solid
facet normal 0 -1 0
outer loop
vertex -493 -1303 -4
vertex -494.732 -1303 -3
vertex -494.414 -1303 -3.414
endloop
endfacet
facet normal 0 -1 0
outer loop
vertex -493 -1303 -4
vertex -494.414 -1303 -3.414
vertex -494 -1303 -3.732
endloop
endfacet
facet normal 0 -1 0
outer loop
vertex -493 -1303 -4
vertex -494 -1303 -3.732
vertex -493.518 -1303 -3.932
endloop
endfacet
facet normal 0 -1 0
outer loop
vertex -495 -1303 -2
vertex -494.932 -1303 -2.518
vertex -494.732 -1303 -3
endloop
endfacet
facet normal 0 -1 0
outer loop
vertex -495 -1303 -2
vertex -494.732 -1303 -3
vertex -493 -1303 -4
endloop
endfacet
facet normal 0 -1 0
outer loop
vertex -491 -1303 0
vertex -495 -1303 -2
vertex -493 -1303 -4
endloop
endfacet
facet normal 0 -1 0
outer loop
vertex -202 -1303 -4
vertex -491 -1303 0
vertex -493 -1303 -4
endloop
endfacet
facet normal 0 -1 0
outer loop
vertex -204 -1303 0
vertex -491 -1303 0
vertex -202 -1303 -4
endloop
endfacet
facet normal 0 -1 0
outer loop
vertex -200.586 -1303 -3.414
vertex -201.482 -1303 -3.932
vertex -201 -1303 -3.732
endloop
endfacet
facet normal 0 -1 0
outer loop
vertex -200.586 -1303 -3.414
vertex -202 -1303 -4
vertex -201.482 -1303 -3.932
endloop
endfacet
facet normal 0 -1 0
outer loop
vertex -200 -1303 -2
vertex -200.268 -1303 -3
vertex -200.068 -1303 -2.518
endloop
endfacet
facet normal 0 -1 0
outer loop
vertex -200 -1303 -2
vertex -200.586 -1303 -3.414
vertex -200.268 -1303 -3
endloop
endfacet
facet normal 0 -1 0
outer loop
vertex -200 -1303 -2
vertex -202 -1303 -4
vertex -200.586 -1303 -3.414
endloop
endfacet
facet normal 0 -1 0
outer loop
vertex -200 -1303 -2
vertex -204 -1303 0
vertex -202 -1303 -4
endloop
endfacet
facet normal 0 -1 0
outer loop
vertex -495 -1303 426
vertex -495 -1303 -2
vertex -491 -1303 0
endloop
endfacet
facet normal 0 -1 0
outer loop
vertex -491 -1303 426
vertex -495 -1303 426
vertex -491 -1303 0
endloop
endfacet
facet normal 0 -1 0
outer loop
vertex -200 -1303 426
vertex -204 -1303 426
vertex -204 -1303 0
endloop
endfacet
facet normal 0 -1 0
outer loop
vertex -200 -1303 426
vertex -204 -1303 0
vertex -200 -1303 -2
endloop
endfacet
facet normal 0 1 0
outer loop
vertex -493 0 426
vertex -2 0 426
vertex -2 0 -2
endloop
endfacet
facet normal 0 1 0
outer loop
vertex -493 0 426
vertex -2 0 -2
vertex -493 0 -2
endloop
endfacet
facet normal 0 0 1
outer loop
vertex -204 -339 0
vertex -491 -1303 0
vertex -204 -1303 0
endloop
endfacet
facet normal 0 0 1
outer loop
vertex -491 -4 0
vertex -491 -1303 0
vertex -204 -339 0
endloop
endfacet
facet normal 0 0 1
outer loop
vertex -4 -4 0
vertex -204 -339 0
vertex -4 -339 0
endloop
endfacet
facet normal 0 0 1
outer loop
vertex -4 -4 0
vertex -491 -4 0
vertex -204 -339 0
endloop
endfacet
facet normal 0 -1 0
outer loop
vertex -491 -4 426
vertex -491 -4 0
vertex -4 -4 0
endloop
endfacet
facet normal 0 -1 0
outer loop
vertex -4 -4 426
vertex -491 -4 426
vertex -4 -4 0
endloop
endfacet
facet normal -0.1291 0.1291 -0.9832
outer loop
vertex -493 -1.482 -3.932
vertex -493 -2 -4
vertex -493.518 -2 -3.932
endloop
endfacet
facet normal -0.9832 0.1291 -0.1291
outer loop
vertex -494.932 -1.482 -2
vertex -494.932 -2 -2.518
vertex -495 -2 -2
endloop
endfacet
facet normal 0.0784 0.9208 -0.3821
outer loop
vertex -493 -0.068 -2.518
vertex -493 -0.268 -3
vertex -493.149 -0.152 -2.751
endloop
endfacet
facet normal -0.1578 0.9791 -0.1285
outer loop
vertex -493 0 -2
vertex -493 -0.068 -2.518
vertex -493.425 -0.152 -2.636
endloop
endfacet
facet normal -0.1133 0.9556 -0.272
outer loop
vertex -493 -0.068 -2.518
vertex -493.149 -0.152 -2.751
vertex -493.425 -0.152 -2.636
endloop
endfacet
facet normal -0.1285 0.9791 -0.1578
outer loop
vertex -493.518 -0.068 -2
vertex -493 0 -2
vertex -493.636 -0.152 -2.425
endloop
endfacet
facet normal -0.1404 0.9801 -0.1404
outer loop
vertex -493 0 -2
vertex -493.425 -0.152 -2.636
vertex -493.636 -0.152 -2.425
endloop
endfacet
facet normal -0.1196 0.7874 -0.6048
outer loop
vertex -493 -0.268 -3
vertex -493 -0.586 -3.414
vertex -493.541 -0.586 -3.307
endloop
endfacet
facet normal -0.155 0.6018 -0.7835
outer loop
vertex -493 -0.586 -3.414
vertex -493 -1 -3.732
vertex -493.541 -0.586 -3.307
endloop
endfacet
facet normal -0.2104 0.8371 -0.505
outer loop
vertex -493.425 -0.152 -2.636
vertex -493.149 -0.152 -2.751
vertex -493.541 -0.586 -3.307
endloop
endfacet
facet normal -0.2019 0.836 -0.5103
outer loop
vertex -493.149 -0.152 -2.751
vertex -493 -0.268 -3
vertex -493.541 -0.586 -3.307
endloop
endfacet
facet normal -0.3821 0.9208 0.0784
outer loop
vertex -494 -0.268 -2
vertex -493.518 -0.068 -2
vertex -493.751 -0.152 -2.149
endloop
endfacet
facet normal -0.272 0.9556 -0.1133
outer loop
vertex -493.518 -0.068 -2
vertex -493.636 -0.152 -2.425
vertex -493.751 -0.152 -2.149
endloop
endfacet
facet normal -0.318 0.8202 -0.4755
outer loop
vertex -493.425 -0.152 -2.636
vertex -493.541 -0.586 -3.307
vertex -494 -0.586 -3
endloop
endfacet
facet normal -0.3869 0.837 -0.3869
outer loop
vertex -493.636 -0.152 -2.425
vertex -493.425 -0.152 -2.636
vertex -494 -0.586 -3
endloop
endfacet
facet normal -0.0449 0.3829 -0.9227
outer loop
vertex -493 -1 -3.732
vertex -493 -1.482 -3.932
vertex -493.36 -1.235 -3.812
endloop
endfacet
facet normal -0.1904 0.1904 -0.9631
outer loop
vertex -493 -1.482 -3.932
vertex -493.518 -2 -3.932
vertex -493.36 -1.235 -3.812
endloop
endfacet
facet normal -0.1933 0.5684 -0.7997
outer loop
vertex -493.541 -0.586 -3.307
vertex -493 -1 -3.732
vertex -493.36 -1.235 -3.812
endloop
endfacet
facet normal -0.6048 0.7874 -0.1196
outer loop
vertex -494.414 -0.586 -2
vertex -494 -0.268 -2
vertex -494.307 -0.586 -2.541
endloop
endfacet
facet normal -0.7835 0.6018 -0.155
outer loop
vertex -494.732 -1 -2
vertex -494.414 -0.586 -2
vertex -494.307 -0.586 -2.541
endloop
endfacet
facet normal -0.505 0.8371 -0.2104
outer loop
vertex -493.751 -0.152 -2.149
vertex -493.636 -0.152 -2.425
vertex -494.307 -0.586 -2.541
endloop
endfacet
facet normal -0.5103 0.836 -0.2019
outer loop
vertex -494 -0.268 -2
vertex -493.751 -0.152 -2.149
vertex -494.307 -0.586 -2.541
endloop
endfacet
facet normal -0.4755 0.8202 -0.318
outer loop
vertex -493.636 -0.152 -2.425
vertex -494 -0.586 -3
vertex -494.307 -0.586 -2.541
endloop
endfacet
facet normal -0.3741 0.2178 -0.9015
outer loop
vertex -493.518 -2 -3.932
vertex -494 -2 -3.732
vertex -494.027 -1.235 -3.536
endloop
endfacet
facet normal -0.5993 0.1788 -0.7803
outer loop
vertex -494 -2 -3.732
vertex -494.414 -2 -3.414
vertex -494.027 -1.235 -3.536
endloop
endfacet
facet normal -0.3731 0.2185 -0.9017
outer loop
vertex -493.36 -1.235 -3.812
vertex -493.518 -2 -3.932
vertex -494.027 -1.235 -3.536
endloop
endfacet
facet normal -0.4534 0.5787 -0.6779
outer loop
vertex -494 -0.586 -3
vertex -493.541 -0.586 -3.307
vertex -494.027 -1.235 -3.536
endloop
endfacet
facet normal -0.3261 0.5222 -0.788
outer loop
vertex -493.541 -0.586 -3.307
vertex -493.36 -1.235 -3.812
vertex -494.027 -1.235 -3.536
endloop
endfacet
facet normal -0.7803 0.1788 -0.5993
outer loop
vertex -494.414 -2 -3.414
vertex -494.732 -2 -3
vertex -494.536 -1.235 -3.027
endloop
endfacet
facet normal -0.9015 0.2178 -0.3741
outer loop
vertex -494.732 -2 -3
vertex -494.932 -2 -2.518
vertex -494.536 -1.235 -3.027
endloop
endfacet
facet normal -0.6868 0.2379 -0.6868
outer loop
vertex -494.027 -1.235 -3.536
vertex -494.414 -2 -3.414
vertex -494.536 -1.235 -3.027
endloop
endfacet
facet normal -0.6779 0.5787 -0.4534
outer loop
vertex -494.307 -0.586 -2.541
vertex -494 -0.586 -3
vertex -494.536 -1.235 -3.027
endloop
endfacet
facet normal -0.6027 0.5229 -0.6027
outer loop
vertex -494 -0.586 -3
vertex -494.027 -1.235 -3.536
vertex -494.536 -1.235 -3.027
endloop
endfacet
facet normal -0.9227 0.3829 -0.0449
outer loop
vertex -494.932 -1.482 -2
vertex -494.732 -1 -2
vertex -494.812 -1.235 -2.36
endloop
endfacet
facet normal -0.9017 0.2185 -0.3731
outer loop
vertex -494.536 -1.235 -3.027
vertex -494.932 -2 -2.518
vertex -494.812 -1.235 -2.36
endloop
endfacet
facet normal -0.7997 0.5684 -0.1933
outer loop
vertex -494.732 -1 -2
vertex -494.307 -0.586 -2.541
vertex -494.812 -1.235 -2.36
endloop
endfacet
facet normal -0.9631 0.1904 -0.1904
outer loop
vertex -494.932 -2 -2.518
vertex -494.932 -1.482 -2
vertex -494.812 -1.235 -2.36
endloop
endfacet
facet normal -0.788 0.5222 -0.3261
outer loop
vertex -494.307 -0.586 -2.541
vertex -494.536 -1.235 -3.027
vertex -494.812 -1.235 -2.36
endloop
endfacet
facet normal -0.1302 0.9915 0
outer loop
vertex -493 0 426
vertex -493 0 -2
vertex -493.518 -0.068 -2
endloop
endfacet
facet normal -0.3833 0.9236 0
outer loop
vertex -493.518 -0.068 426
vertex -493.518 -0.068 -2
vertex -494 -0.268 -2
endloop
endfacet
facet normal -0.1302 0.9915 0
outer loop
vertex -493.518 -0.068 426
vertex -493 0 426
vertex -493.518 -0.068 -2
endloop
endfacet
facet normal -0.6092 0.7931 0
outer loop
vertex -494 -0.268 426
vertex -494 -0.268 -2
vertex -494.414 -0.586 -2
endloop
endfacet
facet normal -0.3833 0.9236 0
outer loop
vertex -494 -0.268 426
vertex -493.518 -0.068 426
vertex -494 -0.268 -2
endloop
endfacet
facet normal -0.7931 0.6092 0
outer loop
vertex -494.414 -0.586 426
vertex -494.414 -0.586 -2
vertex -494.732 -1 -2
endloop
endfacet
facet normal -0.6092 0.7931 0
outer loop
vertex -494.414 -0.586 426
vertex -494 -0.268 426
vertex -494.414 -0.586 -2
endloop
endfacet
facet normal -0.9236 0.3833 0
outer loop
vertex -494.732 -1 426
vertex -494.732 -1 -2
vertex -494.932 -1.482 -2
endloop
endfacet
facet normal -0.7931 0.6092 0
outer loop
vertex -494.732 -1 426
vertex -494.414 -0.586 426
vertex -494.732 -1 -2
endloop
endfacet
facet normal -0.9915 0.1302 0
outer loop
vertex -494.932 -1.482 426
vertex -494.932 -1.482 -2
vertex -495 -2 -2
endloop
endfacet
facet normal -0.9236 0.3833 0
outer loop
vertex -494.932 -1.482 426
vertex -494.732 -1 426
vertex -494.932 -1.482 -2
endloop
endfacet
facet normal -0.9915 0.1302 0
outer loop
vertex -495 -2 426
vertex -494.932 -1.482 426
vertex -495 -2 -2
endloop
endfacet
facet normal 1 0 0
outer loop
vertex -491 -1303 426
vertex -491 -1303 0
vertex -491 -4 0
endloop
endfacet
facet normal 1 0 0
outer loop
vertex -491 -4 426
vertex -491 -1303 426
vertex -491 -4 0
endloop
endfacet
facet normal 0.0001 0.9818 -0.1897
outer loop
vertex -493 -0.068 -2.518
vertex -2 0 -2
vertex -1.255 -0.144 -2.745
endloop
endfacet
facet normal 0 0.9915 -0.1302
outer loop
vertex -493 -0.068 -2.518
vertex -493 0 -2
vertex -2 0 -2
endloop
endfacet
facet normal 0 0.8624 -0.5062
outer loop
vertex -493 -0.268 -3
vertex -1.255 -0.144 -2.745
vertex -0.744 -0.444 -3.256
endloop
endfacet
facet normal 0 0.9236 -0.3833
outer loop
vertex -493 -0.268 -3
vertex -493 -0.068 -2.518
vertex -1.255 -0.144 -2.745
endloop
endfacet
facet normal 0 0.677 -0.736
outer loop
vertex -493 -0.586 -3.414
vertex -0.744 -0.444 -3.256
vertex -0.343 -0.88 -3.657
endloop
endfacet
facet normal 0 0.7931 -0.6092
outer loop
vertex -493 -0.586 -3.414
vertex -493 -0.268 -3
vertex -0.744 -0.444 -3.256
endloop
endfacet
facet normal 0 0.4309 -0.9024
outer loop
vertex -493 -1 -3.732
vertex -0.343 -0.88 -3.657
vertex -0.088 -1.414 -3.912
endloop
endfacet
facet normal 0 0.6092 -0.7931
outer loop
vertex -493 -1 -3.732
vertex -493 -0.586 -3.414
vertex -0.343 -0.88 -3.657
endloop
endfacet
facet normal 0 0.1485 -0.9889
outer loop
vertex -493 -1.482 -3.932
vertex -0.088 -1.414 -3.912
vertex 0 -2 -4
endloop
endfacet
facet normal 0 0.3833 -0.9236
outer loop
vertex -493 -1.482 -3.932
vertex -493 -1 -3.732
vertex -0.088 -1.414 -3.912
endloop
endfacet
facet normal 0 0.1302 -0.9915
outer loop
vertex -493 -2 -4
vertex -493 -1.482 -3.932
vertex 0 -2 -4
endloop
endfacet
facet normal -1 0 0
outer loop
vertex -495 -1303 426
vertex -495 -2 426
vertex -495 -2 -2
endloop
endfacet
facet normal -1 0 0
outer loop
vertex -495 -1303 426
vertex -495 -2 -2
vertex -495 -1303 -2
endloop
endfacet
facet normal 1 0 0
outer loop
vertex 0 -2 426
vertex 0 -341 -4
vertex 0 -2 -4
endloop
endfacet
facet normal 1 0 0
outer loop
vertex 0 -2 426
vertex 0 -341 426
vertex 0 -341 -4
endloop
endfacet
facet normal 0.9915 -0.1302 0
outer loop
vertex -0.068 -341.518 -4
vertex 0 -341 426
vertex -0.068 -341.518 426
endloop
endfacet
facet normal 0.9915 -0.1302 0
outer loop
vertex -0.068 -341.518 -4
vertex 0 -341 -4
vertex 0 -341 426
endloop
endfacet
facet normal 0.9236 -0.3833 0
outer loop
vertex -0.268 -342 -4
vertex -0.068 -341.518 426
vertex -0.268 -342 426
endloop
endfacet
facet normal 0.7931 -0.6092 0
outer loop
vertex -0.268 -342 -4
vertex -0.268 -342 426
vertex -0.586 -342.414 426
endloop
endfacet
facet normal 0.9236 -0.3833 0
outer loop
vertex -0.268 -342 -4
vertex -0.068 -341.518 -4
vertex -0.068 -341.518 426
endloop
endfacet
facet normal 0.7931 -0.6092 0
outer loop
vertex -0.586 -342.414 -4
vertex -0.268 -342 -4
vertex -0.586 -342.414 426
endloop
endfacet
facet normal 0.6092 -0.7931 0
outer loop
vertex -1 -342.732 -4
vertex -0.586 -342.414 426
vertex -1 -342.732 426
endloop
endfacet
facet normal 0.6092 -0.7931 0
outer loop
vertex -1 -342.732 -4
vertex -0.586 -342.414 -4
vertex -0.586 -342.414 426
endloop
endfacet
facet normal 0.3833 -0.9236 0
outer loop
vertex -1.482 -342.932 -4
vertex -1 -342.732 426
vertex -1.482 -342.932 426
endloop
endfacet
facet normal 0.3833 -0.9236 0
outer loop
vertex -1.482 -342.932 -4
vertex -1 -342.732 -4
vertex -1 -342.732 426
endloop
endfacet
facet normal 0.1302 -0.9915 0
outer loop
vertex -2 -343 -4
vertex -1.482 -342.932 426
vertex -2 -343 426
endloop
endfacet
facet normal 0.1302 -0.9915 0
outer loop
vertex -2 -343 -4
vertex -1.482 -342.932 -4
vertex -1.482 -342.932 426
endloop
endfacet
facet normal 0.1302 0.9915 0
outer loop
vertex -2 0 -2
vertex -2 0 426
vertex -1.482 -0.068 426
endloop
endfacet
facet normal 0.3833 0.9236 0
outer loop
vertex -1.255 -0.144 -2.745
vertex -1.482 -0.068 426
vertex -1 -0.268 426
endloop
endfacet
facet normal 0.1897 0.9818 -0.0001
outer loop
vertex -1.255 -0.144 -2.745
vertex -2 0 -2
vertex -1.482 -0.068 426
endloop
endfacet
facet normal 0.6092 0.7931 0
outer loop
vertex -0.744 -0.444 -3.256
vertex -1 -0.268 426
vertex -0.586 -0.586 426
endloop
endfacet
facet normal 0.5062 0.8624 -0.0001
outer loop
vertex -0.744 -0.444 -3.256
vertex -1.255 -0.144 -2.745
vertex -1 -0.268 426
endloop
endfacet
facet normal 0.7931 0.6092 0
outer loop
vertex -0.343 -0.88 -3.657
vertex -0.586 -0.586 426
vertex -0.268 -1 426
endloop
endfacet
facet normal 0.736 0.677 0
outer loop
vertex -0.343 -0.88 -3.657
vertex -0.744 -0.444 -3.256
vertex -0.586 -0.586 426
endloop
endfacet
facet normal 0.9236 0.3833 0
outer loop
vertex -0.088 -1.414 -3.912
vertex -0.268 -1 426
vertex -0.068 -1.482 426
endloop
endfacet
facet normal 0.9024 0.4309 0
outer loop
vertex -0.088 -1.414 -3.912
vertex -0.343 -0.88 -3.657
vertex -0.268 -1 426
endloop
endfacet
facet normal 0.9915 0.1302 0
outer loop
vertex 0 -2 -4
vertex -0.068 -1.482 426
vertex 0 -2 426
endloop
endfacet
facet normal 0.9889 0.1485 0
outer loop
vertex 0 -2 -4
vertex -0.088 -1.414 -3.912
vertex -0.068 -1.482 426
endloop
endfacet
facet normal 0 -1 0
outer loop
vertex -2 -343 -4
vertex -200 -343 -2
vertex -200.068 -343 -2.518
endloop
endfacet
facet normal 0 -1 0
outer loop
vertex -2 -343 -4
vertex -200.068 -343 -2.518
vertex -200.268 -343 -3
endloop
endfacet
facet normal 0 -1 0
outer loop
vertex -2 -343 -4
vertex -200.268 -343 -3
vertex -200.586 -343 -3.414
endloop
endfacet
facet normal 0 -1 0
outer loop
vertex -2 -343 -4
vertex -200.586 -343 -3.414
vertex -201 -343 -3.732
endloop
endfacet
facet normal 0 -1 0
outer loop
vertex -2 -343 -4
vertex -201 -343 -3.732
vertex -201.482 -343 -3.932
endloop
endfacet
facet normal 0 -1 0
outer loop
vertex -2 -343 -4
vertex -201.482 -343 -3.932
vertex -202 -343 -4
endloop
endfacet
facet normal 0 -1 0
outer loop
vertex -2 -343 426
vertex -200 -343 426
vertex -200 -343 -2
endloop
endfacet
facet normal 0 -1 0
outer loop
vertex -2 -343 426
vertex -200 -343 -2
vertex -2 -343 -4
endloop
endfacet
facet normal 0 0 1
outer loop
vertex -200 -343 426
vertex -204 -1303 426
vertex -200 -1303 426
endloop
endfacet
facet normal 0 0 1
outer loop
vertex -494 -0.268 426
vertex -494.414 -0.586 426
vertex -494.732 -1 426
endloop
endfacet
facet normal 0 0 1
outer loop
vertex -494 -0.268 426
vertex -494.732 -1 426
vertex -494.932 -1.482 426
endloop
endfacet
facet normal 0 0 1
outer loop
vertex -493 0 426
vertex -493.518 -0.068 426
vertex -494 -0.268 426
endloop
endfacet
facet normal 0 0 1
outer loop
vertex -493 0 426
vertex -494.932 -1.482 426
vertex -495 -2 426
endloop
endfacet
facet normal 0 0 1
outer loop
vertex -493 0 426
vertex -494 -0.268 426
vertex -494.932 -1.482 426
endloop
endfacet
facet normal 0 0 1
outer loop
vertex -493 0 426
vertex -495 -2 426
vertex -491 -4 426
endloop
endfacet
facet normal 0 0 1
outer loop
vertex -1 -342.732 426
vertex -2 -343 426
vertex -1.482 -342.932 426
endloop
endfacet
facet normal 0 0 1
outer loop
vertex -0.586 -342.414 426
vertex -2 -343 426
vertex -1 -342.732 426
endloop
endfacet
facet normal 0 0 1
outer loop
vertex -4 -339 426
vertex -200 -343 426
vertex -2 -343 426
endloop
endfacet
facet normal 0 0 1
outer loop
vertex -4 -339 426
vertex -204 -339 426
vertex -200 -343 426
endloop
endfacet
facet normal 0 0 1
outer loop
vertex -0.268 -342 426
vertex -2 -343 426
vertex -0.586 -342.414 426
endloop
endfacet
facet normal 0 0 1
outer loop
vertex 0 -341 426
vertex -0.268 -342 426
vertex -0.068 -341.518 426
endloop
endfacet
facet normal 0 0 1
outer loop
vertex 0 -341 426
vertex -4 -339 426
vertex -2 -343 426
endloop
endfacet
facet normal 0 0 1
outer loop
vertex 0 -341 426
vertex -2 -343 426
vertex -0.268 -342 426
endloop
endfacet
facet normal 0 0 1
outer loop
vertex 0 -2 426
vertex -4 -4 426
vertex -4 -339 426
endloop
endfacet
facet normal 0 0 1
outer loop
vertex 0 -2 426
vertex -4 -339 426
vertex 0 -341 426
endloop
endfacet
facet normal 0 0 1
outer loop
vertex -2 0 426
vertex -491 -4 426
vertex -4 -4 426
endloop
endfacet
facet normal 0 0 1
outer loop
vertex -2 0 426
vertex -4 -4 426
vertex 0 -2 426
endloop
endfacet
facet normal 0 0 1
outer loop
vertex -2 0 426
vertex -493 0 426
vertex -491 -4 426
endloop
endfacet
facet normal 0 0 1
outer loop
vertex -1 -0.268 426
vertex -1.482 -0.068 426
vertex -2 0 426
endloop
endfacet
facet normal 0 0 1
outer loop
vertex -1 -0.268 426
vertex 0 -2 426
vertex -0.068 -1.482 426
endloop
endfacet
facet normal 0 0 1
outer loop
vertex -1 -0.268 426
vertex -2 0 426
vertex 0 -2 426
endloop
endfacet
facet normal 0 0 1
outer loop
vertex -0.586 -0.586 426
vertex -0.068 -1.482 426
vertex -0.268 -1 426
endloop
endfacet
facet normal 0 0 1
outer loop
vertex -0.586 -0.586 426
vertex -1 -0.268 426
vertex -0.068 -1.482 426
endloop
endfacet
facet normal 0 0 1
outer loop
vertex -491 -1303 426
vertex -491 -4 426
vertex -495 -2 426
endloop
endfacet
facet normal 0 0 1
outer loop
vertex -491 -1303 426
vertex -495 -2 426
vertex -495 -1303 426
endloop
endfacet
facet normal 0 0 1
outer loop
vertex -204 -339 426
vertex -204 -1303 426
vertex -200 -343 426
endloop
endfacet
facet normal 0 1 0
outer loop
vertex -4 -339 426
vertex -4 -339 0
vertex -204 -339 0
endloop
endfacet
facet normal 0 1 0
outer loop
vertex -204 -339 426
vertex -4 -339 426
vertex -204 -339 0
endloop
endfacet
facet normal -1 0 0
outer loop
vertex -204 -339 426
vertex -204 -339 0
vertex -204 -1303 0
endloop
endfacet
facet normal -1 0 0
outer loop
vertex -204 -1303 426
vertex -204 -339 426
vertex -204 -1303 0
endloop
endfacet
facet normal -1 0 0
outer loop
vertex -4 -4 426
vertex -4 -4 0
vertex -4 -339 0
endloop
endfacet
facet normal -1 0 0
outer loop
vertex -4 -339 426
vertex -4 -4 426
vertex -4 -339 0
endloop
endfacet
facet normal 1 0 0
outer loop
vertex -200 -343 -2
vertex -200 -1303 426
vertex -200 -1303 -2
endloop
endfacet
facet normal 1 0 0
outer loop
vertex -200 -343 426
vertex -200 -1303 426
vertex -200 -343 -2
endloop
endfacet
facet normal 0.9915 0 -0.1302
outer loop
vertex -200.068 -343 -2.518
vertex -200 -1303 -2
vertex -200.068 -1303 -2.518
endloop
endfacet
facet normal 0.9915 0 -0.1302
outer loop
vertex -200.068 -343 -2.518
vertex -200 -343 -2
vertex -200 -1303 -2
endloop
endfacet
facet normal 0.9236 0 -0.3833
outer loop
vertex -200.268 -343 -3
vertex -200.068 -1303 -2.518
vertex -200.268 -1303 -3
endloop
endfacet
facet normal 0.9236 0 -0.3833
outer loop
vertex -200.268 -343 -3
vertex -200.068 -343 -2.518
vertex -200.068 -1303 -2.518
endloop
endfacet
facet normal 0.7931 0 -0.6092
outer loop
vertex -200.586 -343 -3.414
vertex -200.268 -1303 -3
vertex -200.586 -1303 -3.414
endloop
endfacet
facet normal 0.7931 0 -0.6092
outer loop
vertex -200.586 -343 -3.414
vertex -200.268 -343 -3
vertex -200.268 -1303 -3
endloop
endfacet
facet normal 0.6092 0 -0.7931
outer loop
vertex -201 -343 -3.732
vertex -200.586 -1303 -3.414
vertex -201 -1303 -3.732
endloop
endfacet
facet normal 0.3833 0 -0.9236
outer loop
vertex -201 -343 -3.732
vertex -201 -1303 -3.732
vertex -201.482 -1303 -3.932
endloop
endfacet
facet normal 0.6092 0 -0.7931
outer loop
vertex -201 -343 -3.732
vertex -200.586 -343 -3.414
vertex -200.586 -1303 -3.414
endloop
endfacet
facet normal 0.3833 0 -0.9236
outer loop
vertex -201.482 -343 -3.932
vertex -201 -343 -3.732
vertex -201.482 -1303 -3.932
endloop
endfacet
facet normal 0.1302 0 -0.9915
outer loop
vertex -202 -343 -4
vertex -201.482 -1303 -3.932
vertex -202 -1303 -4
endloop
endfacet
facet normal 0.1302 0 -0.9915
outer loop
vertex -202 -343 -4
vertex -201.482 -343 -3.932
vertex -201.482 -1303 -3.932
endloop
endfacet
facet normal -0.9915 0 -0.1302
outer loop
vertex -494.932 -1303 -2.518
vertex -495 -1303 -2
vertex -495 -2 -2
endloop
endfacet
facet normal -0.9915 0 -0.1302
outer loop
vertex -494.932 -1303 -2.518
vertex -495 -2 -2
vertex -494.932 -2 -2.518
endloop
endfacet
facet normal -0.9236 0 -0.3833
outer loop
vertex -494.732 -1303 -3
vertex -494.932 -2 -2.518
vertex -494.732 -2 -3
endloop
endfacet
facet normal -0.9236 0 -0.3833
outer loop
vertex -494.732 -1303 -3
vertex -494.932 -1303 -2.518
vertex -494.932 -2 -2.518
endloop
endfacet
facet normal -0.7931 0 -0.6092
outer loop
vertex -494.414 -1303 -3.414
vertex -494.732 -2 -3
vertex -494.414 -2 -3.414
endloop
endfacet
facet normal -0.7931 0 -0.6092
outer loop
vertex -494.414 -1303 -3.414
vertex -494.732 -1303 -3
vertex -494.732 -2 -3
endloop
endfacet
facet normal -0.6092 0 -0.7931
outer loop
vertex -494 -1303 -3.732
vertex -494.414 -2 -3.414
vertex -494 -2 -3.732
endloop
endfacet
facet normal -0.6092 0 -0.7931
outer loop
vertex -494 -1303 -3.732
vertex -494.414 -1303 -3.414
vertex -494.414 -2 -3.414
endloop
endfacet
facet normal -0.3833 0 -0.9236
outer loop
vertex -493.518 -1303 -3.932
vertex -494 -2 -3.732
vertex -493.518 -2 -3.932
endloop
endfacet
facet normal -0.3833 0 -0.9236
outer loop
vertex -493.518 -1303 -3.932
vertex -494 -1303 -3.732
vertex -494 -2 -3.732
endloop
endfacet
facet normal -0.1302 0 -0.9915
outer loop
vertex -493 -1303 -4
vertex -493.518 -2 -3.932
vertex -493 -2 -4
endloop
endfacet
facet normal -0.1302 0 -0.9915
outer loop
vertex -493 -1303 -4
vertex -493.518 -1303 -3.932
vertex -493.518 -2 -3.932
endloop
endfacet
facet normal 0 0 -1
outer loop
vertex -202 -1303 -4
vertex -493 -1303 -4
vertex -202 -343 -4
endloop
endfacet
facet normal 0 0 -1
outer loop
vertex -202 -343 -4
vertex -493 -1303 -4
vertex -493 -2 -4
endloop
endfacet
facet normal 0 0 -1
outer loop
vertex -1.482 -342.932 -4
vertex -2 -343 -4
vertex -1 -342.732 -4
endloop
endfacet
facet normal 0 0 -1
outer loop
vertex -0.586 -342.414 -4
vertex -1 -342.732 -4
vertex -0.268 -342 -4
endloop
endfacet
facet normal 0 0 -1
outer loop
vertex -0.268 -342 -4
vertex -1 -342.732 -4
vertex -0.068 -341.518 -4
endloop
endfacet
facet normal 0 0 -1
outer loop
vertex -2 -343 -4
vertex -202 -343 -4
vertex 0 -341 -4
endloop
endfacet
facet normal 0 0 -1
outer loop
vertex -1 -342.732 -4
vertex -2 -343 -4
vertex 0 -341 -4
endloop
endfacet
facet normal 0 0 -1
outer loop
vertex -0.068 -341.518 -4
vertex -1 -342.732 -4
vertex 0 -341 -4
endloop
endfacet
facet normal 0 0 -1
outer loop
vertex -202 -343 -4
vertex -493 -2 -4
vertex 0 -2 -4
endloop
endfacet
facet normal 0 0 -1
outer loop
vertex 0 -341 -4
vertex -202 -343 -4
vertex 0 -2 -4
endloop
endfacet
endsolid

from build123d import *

# Parameters (mm, degrees)
F1_DEPTH = 426
F3_DEPTH = 4
F4_R     = 2


# Not quite as in the source:
# - a feature names something its author has since deleted; it is built from what else it names


with BuildPart() as f1:
    # F0 (on Top) → F1 (new body)
    with BuildSketch(Plane.XY):
        Polygon((-200, -343), (0, -343), (0, 0), (-495, 0), (-495, -1303), (-491, -1303), (-491, -4), (-4, -4), (-4, -339), (-204, -339), (-204, -1303), (-200, -1303), align=None)
    extrude(amount=F1_DEPTH)

    # F2 (on Top) → F3 (join)
    with BuildSketch(Plane.XY):
        Polygon((0, 0), (-495, 0), (-495, -1303), (-200, -1303), (-200, -343), (0, -343), align=None)
    extrude(amount=-F3_DEPTH)

    # F4
    f4_edges = [f1.edges().sort_by_distance(p)[0] for p in [
        (-200, -823, -4),
        (-495, -651.5, -4),
        (-247.5, 0, -4),
        (-495, 0, 211),
        (0, -343, 211),
        (0, 0, 211),
    ]]
    fillet(f4_edges, radius=F4_R)


solid = f1.part
